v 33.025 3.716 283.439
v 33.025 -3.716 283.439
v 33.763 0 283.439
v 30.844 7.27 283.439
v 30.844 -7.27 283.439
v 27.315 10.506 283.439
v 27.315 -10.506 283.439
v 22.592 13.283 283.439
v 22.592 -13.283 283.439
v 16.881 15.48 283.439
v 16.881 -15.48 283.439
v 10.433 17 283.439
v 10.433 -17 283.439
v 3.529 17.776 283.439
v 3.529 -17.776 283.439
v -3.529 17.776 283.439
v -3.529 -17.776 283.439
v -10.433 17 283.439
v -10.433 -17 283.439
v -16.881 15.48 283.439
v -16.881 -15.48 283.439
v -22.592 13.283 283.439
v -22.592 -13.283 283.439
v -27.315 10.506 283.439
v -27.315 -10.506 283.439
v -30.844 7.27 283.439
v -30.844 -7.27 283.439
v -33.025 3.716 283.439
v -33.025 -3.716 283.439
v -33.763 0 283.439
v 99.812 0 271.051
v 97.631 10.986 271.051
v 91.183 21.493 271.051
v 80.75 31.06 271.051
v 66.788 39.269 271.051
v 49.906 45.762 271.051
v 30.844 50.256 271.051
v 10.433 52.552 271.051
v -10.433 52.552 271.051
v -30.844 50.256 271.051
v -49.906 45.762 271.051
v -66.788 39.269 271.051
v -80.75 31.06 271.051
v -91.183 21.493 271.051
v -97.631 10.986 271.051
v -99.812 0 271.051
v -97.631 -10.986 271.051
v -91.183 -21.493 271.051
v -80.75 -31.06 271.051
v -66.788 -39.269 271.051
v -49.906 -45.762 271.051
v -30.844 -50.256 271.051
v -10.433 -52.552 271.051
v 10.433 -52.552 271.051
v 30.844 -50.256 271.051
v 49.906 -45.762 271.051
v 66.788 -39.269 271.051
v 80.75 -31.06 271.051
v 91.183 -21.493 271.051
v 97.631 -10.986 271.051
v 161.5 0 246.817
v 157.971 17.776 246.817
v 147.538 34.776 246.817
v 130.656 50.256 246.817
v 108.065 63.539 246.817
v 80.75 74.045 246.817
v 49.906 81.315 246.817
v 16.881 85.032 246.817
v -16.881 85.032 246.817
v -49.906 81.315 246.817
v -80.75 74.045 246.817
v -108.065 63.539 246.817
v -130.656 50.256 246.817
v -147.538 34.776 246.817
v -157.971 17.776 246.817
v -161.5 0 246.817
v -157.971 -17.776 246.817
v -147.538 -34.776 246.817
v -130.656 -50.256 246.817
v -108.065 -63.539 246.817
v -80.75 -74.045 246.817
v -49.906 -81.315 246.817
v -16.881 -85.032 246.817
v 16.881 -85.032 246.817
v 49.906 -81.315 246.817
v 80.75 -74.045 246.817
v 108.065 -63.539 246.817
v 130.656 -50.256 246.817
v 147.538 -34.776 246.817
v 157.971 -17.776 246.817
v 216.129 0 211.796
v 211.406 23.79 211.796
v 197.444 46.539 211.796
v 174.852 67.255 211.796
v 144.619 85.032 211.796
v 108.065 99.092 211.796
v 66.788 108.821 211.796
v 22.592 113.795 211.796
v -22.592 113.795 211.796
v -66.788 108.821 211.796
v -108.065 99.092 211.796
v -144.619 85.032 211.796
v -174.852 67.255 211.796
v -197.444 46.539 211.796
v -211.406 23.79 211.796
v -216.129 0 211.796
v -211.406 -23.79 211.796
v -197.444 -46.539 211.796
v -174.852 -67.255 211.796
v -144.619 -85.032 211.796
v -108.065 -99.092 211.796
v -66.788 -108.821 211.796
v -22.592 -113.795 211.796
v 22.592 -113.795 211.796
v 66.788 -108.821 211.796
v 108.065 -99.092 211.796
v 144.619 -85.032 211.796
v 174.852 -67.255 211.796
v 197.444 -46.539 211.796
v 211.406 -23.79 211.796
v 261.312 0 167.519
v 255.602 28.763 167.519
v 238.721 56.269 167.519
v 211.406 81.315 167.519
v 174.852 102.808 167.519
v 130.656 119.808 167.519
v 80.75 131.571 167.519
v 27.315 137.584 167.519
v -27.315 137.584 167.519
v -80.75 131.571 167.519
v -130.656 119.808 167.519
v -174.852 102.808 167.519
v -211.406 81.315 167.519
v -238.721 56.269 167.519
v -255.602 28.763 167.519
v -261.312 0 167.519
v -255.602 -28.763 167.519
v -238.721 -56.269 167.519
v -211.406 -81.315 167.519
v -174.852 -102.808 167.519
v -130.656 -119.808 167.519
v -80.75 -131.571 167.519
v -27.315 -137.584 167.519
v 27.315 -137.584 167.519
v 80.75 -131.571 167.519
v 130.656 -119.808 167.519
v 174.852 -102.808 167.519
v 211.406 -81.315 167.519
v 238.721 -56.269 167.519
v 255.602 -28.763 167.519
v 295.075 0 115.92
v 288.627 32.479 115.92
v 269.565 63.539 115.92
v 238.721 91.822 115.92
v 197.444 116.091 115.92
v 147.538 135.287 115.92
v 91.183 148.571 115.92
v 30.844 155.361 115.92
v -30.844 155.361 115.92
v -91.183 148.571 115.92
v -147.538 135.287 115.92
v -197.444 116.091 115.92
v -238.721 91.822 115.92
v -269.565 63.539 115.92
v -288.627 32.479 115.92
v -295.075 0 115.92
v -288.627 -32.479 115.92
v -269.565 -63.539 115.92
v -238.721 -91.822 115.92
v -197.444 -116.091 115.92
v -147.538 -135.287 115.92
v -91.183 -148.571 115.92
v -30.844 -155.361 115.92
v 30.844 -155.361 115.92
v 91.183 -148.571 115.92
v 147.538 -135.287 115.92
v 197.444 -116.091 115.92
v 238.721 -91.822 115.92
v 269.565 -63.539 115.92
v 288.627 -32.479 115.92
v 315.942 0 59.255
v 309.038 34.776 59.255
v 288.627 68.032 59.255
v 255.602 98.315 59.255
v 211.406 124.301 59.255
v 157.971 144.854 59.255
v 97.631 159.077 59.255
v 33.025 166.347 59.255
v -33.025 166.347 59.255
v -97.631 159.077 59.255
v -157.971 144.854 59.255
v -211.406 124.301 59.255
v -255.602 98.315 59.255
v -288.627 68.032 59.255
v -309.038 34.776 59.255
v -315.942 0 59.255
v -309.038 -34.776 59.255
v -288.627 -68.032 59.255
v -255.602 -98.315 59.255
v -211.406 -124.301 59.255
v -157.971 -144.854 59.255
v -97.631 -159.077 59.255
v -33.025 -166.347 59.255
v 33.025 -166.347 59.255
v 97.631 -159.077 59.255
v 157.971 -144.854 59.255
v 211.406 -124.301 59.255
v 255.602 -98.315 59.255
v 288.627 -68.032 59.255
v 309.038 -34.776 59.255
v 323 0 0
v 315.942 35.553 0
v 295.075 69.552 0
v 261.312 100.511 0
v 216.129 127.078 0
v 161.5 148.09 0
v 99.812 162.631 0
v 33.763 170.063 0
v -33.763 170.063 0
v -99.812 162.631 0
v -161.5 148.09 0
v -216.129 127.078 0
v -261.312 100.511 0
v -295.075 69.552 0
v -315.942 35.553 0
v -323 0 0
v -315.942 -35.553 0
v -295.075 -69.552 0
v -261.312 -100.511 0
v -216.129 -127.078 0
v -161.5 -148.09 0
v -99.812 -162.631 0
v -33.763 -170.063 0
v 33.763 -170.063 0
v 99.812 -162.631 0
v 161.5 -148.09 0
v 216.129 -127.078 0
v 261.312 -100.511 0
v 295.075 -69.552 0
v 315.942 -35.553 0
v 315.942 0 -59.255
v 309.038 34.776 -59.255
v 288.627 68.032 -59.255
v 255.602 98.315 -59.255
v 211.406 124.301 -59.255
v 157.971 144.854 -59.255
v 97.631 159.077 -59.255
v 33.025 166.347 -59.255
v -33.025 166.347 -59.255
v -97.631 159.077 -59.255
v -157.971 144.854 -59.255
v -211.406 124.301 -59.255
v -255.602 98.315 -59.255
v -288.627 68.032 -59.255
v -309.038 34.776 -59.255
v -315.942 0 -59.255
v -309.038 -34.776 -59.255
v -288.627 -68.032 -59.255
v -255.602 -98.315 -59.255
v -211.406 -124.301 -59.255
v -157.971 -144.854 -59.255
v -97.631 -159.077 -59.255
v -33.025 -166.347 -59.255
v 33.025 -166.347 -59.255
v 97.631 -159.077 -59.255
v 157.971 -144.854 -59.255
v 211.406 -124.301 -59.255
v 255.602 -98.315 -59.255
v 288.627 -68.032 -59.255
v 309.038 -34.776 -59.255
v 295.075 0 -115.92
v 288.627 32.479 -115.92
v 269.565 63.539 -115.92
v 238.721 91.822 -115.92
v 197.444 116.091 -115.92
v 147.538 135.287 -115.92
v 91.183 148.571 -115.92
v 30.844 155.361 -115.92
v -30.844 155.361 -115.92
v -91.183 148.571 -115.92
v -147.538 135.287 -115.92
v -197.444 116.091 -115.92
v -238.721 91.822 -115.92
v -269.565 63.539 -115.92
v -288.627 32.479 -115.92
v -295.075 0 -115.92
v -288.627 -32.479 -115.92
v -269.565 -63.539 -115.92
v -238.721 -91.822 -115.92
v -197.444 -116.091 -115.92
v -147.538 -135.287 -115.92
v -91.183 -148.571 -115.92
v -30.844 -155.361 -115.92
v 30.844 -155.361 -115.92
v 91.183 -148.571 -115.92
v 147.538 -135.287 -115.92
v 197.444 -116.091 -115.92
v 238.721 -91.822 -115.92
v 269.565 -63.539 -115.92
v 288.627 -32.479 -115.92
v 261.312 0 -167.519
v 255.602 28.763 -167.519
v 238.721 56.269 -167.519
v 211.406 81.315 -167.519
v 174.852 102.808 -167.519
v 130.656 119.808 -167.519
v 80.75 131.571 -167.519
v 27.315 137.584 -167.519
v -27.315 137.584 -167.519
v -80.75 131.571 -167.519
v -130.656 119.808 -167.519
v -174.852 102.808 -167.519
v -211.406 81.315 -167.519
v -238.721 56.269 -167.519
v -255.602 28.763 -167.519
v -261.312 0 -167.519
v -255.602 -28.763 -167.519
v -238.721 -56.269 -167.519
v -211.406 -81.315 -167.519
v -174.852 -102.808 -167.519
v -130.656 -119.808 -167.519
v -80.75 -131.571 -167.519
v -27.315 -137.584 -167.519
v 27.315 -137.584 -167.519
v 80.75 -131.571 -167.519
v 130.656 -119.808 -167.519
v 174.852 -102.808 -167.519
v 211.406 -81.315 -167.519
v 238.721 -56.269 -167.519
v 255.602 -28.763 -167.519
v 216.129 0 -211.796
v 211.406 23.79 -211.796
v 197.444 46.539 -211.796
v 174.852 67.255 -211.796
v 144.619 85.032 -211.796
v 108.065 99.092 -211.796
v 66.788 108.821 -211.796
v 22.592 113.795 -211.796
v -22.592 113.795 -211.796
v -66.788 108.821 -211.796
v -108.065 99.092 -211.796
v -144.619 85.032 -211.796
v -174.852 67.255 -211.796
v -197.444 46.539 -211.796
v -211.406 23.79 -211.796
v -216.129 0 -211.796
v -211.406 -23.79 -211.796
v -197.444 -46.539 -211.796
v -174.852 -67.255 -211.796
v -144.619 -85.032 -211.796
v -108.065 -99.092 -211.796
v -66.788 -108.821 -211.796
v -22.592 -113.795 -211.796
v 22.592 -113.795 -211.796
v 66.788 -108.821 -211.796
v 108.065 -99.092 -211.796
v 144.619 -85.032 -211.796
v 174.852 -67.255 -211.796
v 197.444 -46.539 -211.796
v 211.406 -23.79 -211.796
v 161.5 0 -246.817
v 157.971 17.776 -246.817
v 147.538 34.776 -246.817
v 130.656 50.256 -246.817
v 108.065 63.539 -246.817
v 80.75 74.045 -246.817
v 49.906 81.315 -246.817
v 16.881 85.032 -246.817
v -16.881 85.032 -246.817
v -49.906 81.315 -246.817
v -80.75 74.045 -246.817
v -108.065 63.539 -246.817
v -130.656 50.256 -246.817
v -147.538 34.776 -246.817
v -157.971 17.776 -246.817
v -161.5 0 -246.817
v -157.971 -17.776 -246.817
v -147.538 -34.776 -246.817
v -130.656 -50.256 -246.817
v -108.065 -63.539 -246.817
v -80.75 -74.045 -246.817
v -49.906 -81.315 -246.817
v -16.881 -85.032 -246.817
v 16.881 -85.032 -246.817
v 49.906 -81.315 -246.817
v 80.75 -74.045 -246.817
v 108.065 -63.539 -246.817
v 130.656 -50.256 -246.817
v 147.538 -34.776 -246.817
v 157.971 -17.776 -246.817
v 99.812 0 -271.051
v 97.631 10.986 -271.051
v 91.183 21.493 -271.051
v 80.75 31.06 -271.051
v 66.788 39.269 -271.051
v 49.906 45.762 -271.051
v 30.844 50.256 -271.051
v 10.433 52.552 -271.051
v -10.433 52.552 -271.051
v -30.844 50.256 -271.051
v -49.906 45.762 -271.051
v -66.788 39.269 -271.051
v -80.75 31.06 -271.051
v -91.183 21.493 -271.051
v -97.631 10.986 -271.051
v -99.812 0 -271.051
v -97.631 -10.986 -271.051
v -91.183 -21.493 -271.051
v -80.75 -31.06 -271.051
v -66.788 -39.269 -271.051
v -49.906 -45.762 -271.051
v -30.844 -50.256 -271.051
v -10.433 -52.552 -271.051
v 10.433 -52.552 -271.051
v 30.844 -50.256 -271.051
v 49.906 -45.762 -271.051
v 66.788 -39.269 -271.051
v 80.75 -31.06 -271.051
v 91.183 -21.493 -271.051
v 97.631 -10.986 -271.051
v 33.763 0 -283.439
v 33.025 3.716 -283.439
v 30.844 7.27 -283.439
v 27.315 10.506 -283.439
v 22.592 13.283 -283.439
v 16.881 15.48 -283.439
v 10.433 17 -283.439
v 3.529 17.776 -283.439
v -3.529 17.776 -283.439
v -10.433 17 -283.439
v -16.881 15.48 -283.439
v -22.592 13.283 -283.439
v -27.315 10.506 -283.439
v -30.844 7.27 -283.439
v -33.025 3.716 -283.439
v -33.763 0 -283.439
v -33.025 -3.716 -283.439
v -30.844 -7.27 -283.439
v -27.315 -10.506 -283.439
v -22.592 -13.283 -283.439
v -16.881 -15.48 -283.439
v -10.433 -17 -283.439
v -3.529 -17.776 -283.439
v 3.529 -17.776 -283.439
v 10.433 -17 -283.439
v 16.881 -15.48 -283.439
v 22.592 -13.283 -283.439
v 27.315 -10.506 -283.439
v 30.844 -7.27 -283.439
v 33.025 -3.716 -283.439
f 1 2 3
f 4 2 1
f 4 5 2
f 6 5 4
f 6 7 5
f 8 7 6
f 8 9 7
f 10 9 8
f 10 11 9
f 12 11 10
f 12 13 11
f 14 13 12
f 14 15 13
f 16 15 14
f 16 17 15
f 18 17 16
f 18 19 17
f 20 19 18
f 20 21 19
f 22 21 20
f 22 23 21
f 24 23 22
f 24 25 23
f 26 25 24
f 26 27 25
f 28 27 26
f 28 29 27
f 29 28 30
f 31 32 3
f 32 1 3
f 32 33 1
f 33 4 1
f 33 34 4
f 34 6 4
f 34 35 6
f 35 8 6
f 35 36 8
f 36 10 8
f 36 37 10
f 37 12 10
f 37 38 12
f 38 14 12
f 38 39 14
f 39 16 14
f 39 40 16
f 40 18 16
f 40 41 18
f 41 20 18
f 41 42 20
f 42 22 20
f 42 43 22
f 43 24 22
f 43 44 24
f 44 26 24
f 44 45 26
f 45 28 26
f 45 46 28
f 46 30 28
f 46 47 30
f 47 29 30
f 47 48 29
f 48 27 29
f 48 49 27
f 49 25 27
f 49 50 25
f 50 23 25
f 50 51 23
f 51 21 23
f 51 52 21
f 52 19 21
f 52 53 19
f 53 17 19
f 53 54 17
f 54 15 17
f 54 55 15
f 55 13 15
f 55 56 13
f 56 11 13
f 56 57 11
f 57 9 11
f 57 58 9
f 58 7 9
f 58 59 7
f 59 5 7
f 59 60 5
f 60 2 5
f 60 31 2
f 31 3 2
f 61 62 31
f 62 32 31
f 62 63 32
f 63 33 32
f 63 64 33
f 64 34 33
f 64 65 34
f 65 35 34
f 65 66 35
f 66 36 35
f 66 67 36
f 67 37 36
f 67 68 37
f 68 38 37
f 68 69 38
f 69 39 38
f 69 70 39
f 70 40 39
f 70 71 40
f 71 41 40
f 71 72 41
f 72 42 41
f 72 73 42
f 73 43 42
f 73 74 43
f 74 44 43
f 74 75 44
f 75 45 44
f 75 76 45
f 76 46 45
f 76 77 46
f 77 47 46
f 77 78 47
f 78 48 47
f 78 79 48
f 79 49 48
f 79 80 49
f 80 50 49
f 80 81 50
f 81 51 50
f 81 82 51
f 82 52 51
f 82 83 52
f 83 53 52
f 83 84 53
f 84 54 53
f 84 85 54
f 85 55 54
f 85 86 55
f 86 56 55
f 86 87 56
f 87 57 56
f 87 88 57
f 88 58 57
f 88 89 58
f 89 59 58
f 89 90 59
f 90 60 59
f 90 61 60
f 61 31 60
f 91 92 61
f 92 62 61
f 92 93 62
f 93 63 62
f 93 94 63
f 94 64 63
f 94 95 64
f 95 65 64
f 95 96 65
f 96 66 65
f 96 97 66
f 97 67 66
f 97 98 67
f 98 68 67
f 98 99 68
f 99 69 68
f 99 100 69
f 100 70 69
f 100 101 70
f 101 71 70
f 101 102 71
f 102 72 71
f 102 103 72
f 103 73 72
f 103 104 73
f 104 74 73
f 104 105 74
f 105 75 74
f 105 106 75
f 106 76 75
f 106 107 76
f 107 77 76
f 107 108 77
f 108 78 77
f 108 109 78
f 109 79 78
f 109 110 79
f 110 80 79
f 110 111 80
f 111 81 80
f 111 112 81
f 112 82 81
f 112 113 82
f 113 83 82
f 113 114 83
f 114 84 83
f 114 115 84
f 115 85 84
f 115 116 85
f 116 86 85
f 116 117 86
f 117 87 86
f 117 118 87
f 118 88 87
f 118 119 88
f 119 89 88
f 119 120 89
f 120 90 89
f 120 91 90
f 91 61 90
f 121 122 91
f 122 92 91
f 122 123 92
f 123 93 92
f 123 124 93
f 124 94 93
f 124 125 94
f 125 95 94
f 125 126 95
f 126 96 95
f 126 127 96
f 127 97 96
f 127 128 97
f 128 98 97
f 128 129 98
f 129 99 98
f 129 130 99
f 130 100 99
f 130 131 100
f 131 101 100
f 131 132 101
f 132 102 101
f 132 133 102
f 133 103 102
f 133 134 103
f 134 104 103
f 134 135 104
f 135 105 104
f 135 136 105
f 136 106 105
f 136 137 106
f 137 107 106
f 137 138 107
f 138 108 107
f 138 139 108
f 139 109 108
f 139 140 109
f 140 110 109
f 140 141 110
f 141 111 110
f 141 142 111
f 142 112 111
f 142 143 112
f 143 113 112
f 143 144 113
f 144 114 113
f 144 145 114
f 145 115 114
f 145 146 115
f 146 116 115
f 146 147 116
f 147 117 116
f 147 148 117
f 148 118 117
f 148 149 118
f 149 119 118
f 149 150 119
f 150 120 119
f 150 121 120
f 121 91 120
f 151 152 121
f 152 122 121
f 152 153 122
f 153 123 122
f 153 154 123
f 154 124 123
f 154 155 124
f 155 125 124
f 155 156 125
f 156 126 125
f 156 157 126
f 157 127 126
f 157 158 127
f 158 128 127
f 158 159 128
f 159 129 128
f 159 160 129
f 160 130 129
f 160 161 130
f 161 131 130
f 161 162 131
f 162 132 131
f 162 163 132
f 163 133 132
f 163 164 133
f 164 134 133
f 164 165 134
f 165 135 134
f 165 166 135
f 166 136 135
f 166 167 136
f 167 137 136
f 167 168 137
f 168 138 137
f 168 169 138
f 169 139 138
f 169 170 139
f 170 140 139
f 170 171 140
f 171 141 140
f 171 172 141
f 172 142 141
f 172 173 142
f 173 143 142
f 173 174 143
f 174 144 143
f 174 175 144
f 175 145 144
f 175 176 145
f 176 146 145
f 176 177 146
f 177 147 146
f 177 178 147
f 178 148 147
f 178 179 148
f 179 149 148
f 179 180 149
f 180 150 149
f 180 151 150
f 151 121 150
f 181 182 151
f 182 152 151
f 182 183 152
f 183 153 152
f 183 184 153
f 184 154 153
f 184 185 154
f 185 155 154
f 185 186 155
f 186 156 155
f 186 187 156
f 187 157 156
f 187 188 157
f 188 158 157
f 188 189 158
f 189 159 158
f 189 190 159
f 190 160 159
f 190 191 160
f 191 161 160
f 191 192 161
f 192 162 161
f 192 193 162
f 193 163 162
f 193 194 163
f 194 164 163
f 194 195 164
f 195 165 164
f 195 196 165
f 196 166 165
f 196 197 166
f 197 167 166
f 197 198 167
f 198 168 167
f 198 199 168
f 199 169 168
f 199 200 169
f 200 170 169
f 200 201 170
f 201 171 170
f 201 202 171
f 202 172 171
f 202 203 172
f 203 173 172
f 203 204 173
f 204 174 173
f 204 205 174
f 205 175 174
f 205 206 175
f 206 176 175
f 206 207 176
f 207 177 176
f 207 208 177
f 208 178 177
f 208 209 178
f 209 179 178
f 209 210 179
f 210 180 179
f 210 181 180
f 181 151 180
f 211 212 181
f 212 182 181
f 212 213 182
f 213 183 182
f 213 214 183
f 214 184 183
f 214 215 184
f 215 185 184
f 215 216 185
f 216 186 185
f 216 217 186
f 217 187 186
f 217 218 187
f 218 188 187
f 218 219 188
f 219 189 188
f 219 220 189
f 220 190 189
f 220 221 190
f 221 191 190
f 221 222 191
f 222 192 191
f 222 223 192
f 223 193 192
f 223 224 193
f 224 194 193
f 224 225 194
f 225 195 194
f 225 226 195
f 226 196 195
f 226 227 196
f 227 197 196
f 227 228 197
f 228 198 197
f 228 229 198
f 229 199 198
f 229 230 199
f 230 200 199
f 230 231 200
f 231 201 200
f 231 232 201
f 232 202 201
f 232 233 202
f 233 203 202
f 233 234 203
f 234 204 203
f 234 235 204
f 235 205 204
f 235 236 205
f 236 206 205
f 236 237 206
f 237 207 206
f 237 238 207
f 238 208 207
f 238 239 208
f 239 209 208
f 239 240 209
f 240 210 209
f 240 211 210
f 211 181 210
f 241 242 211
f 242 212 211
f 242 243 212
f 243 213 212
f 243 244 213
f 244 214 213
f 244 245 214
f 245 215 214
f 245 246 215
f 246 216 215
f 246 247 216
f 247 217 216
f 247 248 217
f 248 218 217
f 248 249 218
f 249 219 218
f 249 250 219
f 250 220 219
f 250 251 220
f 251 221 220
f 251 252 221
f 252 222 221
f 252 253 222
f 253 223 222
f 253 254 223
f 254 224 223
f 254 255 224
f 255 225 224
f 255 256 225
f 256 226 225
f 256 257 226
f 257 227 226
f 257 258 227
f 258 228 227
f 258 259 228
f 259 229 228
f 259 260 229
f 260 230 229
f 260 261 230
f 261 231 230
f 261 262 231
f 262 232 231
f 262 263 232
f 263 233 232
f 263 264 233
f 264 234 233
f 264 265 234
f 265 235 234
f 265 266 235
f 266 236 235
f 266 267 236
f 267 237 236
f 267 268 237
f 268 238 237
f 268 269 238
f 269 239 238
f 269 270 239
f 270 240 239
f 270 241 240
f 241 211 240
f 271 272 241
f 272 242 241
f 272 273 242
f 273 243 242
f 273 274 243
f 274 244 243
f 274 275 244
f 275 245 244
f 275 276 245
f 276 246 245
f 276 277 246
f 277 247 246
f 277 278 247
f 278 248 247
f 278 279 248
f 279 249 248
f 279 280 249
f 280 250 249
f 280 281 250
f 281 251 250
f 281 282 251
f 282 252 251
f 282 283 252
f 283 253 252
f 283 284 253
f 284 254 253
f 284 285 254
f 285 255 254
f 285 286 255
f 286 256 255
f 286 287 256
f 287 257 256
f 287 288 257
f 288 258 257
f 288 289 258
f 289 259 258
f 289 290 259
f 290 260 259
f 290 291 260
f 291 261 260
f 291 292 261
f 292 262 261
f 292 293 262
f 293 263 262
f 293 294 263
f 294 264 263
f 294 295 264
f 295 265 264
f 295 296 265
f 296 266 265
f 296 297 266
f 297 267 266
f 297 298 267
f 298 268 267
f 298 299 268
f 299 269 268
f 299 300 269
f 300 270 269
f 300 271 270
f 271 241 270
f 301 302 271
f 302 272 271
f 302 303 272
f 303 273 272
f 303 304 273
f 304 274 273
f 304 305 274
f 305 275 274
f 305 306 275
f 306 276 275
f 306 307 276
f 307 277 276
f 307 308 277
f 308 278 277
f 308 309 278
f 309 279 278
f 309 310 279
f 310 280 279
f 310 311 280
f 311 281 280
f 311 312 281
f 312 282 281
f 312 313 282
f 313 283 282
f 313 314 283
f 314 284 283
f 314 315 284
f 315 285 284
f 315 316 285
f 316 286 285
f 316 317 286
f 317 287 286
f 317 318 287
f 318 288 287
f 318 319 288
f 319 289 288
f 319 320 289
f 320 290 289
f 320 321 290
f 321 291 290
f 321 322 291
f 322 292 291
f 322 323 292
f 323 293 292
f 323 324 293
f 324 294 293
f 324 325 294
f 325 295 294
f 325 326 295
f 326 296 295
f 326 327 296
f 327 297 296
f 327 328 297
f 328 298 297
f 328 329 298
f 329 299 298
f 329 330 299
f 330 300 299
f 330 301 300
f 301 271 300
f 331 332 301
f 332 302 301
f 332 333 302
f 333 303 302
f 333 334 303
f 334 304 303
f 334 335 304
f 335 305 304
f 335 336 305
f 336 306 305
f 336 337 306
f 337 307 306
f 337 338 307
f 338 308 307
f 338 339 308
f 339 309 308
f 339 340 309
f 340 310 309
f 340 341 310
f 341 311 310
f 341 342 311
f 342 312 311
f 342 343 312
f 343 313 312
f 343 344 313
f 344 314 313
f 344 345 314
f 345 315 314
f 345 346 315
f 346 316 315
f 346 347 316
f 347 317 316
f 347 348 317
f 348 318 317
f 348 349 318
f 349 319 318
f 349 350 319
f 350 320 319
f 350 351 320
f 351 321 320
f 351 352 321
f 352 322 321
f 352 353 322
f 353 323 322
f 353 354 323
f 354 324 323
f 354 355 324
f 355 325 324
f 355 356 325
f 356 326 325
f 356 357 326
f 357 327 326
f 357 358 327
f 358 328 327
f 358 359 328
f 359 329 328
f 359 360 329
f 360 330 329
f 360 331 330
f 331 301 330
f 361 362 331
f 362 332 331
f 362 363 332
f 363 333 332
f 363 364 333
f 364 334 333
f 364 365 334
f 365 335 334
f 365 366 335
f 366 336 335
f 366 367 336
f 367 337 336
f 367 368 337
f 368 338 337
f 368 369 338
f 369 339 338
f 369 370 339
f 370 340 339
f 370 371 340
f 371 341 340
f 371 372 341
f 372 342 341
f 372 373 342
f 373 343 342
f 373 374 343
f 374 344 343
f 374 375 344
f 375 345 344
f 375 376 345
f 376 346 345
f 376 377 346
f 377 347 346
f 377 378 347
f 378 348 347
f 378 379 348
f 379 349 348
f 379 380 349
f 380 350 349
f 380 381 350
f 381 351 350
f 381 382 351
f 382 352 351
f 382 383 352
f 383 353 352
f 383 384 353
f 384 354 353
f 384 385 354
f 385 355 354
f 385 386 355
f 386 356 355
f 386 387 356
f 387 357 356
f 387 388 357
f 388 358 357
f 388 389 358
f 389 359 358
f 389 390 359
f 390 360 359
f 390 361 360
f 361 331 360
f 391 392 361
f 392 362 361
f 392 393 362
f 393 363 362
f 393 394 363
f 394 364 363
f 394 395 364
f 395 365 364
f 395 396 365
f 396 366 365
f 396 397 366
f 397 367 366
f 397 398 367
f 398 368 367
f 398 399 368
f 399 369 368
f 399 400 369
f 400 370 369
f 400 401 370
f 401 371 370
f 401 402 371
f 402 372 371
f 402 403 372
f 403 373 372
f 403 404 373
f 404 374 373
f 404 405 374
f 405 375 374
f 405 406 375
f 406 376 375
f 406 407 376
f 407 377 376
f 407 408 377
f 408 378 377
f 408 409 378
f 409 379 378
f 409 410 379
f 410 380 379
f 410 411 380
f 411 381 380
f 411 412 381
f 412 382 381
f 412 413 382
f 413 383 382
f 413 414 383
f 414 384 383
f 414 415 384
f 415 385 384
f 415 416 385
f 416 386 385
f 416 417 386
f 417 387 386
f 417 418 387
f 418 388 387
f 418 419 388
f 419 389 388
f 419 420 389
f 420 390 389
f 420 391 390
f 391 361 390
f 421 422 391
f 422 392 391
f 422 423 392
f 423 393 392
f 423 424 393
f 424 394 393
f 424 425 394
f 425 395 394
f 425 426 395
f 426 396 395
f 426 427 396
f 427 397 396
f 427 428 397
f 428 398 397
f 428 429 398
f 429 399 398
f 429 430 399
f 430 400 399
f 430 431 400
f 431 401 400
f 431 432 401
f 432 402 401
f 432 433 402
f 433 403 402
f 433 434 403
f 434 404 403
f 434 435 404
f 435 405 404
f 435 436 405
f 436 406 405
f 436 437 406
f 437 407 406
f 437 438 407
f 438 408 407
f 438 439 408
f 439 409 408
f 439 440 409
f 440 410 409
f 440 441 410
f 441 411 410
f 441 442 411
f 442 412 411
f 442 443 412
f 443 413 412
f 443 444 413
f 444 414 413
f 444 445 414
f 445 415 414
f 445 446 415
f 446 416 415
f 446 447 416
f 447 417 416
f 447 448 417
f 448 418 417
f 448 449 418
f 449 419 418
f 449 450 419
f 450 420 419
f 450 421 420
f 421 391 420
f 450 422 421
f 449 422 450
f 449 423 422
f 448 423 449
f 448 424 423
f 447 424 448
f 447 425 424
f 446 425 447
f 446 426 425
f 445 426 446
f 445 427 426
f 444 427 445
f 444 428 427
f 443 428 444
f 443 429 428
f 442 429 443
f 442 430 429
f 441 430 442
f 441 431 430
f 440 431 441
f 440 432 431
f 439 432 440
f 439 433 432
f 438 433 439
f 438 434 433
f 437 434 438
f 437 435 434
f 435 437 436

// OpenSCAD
// Generated by SolidPython 1.0.1 on 2020-07-29 00:46:53


scale(v = [17, 9, 15]) {
	sphere(r = 19);
}
/***********************************************
*********      SolidPython code:      **********
************************************************
 
# import packages: SolidPython
from solid import *
from solid.utils import *
from itertools import chain, combinations, permutations


class Resize:

    def __init__(self, scad_file):
        self.scad_file = scad_file
        #self.scad_file = import_scad(scad_file)
        # cone/cylinder param:
        self.r1 = 0
        self.r2 = 0
        self.h = 0
        # rectangular prism param:
        self.w = 0
        self.l = 0
        # ellipse param:
        self.r = 0

    # import OpenScad code (file name corresponds to shape)


    # classify shape + parameters
    def assign(self, param1, param2, param3):
        if self.scad_file == 'cone.scad':
            self.r1 = param1
            self.r2 = param2
            self.h = param3
        elif self.scad_file == 'cylinder.scad':
            self.r1 = param1
            self.r2 = param2
            self.h = param3
        elif self.scad_file == 'rectangularPrism.scad':
            self.h = param1
            self.l = param2
            self.w = param3
        else:
            self.r = param1
            self.h = param2

    # resize parameters
    def iterate(self):
        x = range(3, 20, 2)
        i = 1
        if self.scad_file == 'cone.scad':
            tempList = list(permutations(x, 2))
            for temp in tempList:
                param1 = temp[0]
                param2 = temp[1]
                filepath = 'produced_scad_files/' + 'cone' + str(param1) + '_' + str(param2) + '_' + '.scad'
                scad_render_to_file(cylinder(h=param1, r1=param2, r2=0), filepath)

        elif self.scad_file == 'cylinder.scad':
            tempList = list(permutations(x, 3))
            for temp in tempList:
                param1 = temp[0]
                param2 = temp[1]
                filepath = 'produced_scad_files/' + 'cylinder' + str(param1) + '_' + str(param2) + '_' + '.scad'
                scad_render_to_file(cylinder(h=param1, r1=param2, r2=param2), filepath)

        elif self.scad_file == 'rectangularPrism.scad':
            tempList = list(permutations(x, 3))
            for temp in tempList:
                param1 = temp[0]
                param2 = temp[1]
                param3 = temp[2]
                filepath = 'produced_scad_files/' + 'rectangularPrism' + str(param1) + '_' + str(param2) + '_' + str(
                    param3) + '.scad'
                scad_render_to_file(cube(size=(param1, param2, param3)), filepath)

        elif self.scad_file == 'ellipse.scad':
            tempList = list(permutations(x, 4))
            for temp in tempList:
                param1 = temp[0]
                param2 = temp[1]
                param3 = temp[2]
                param4 = temp[3]
                filepath = 'produced_scad_files/' + 'ellipse' + str(param1) + '_' + str(param2) + '_' + str(param3) + '_' + str(param4) + '.scad'
                scad_render_to_file(scale([param1, param2, param3])(sphere(r=param4)), filepath)

    def render_to_scadfile(self):
        scad_render_to_file(scad, 'example.scad') 
 
************************************************/
